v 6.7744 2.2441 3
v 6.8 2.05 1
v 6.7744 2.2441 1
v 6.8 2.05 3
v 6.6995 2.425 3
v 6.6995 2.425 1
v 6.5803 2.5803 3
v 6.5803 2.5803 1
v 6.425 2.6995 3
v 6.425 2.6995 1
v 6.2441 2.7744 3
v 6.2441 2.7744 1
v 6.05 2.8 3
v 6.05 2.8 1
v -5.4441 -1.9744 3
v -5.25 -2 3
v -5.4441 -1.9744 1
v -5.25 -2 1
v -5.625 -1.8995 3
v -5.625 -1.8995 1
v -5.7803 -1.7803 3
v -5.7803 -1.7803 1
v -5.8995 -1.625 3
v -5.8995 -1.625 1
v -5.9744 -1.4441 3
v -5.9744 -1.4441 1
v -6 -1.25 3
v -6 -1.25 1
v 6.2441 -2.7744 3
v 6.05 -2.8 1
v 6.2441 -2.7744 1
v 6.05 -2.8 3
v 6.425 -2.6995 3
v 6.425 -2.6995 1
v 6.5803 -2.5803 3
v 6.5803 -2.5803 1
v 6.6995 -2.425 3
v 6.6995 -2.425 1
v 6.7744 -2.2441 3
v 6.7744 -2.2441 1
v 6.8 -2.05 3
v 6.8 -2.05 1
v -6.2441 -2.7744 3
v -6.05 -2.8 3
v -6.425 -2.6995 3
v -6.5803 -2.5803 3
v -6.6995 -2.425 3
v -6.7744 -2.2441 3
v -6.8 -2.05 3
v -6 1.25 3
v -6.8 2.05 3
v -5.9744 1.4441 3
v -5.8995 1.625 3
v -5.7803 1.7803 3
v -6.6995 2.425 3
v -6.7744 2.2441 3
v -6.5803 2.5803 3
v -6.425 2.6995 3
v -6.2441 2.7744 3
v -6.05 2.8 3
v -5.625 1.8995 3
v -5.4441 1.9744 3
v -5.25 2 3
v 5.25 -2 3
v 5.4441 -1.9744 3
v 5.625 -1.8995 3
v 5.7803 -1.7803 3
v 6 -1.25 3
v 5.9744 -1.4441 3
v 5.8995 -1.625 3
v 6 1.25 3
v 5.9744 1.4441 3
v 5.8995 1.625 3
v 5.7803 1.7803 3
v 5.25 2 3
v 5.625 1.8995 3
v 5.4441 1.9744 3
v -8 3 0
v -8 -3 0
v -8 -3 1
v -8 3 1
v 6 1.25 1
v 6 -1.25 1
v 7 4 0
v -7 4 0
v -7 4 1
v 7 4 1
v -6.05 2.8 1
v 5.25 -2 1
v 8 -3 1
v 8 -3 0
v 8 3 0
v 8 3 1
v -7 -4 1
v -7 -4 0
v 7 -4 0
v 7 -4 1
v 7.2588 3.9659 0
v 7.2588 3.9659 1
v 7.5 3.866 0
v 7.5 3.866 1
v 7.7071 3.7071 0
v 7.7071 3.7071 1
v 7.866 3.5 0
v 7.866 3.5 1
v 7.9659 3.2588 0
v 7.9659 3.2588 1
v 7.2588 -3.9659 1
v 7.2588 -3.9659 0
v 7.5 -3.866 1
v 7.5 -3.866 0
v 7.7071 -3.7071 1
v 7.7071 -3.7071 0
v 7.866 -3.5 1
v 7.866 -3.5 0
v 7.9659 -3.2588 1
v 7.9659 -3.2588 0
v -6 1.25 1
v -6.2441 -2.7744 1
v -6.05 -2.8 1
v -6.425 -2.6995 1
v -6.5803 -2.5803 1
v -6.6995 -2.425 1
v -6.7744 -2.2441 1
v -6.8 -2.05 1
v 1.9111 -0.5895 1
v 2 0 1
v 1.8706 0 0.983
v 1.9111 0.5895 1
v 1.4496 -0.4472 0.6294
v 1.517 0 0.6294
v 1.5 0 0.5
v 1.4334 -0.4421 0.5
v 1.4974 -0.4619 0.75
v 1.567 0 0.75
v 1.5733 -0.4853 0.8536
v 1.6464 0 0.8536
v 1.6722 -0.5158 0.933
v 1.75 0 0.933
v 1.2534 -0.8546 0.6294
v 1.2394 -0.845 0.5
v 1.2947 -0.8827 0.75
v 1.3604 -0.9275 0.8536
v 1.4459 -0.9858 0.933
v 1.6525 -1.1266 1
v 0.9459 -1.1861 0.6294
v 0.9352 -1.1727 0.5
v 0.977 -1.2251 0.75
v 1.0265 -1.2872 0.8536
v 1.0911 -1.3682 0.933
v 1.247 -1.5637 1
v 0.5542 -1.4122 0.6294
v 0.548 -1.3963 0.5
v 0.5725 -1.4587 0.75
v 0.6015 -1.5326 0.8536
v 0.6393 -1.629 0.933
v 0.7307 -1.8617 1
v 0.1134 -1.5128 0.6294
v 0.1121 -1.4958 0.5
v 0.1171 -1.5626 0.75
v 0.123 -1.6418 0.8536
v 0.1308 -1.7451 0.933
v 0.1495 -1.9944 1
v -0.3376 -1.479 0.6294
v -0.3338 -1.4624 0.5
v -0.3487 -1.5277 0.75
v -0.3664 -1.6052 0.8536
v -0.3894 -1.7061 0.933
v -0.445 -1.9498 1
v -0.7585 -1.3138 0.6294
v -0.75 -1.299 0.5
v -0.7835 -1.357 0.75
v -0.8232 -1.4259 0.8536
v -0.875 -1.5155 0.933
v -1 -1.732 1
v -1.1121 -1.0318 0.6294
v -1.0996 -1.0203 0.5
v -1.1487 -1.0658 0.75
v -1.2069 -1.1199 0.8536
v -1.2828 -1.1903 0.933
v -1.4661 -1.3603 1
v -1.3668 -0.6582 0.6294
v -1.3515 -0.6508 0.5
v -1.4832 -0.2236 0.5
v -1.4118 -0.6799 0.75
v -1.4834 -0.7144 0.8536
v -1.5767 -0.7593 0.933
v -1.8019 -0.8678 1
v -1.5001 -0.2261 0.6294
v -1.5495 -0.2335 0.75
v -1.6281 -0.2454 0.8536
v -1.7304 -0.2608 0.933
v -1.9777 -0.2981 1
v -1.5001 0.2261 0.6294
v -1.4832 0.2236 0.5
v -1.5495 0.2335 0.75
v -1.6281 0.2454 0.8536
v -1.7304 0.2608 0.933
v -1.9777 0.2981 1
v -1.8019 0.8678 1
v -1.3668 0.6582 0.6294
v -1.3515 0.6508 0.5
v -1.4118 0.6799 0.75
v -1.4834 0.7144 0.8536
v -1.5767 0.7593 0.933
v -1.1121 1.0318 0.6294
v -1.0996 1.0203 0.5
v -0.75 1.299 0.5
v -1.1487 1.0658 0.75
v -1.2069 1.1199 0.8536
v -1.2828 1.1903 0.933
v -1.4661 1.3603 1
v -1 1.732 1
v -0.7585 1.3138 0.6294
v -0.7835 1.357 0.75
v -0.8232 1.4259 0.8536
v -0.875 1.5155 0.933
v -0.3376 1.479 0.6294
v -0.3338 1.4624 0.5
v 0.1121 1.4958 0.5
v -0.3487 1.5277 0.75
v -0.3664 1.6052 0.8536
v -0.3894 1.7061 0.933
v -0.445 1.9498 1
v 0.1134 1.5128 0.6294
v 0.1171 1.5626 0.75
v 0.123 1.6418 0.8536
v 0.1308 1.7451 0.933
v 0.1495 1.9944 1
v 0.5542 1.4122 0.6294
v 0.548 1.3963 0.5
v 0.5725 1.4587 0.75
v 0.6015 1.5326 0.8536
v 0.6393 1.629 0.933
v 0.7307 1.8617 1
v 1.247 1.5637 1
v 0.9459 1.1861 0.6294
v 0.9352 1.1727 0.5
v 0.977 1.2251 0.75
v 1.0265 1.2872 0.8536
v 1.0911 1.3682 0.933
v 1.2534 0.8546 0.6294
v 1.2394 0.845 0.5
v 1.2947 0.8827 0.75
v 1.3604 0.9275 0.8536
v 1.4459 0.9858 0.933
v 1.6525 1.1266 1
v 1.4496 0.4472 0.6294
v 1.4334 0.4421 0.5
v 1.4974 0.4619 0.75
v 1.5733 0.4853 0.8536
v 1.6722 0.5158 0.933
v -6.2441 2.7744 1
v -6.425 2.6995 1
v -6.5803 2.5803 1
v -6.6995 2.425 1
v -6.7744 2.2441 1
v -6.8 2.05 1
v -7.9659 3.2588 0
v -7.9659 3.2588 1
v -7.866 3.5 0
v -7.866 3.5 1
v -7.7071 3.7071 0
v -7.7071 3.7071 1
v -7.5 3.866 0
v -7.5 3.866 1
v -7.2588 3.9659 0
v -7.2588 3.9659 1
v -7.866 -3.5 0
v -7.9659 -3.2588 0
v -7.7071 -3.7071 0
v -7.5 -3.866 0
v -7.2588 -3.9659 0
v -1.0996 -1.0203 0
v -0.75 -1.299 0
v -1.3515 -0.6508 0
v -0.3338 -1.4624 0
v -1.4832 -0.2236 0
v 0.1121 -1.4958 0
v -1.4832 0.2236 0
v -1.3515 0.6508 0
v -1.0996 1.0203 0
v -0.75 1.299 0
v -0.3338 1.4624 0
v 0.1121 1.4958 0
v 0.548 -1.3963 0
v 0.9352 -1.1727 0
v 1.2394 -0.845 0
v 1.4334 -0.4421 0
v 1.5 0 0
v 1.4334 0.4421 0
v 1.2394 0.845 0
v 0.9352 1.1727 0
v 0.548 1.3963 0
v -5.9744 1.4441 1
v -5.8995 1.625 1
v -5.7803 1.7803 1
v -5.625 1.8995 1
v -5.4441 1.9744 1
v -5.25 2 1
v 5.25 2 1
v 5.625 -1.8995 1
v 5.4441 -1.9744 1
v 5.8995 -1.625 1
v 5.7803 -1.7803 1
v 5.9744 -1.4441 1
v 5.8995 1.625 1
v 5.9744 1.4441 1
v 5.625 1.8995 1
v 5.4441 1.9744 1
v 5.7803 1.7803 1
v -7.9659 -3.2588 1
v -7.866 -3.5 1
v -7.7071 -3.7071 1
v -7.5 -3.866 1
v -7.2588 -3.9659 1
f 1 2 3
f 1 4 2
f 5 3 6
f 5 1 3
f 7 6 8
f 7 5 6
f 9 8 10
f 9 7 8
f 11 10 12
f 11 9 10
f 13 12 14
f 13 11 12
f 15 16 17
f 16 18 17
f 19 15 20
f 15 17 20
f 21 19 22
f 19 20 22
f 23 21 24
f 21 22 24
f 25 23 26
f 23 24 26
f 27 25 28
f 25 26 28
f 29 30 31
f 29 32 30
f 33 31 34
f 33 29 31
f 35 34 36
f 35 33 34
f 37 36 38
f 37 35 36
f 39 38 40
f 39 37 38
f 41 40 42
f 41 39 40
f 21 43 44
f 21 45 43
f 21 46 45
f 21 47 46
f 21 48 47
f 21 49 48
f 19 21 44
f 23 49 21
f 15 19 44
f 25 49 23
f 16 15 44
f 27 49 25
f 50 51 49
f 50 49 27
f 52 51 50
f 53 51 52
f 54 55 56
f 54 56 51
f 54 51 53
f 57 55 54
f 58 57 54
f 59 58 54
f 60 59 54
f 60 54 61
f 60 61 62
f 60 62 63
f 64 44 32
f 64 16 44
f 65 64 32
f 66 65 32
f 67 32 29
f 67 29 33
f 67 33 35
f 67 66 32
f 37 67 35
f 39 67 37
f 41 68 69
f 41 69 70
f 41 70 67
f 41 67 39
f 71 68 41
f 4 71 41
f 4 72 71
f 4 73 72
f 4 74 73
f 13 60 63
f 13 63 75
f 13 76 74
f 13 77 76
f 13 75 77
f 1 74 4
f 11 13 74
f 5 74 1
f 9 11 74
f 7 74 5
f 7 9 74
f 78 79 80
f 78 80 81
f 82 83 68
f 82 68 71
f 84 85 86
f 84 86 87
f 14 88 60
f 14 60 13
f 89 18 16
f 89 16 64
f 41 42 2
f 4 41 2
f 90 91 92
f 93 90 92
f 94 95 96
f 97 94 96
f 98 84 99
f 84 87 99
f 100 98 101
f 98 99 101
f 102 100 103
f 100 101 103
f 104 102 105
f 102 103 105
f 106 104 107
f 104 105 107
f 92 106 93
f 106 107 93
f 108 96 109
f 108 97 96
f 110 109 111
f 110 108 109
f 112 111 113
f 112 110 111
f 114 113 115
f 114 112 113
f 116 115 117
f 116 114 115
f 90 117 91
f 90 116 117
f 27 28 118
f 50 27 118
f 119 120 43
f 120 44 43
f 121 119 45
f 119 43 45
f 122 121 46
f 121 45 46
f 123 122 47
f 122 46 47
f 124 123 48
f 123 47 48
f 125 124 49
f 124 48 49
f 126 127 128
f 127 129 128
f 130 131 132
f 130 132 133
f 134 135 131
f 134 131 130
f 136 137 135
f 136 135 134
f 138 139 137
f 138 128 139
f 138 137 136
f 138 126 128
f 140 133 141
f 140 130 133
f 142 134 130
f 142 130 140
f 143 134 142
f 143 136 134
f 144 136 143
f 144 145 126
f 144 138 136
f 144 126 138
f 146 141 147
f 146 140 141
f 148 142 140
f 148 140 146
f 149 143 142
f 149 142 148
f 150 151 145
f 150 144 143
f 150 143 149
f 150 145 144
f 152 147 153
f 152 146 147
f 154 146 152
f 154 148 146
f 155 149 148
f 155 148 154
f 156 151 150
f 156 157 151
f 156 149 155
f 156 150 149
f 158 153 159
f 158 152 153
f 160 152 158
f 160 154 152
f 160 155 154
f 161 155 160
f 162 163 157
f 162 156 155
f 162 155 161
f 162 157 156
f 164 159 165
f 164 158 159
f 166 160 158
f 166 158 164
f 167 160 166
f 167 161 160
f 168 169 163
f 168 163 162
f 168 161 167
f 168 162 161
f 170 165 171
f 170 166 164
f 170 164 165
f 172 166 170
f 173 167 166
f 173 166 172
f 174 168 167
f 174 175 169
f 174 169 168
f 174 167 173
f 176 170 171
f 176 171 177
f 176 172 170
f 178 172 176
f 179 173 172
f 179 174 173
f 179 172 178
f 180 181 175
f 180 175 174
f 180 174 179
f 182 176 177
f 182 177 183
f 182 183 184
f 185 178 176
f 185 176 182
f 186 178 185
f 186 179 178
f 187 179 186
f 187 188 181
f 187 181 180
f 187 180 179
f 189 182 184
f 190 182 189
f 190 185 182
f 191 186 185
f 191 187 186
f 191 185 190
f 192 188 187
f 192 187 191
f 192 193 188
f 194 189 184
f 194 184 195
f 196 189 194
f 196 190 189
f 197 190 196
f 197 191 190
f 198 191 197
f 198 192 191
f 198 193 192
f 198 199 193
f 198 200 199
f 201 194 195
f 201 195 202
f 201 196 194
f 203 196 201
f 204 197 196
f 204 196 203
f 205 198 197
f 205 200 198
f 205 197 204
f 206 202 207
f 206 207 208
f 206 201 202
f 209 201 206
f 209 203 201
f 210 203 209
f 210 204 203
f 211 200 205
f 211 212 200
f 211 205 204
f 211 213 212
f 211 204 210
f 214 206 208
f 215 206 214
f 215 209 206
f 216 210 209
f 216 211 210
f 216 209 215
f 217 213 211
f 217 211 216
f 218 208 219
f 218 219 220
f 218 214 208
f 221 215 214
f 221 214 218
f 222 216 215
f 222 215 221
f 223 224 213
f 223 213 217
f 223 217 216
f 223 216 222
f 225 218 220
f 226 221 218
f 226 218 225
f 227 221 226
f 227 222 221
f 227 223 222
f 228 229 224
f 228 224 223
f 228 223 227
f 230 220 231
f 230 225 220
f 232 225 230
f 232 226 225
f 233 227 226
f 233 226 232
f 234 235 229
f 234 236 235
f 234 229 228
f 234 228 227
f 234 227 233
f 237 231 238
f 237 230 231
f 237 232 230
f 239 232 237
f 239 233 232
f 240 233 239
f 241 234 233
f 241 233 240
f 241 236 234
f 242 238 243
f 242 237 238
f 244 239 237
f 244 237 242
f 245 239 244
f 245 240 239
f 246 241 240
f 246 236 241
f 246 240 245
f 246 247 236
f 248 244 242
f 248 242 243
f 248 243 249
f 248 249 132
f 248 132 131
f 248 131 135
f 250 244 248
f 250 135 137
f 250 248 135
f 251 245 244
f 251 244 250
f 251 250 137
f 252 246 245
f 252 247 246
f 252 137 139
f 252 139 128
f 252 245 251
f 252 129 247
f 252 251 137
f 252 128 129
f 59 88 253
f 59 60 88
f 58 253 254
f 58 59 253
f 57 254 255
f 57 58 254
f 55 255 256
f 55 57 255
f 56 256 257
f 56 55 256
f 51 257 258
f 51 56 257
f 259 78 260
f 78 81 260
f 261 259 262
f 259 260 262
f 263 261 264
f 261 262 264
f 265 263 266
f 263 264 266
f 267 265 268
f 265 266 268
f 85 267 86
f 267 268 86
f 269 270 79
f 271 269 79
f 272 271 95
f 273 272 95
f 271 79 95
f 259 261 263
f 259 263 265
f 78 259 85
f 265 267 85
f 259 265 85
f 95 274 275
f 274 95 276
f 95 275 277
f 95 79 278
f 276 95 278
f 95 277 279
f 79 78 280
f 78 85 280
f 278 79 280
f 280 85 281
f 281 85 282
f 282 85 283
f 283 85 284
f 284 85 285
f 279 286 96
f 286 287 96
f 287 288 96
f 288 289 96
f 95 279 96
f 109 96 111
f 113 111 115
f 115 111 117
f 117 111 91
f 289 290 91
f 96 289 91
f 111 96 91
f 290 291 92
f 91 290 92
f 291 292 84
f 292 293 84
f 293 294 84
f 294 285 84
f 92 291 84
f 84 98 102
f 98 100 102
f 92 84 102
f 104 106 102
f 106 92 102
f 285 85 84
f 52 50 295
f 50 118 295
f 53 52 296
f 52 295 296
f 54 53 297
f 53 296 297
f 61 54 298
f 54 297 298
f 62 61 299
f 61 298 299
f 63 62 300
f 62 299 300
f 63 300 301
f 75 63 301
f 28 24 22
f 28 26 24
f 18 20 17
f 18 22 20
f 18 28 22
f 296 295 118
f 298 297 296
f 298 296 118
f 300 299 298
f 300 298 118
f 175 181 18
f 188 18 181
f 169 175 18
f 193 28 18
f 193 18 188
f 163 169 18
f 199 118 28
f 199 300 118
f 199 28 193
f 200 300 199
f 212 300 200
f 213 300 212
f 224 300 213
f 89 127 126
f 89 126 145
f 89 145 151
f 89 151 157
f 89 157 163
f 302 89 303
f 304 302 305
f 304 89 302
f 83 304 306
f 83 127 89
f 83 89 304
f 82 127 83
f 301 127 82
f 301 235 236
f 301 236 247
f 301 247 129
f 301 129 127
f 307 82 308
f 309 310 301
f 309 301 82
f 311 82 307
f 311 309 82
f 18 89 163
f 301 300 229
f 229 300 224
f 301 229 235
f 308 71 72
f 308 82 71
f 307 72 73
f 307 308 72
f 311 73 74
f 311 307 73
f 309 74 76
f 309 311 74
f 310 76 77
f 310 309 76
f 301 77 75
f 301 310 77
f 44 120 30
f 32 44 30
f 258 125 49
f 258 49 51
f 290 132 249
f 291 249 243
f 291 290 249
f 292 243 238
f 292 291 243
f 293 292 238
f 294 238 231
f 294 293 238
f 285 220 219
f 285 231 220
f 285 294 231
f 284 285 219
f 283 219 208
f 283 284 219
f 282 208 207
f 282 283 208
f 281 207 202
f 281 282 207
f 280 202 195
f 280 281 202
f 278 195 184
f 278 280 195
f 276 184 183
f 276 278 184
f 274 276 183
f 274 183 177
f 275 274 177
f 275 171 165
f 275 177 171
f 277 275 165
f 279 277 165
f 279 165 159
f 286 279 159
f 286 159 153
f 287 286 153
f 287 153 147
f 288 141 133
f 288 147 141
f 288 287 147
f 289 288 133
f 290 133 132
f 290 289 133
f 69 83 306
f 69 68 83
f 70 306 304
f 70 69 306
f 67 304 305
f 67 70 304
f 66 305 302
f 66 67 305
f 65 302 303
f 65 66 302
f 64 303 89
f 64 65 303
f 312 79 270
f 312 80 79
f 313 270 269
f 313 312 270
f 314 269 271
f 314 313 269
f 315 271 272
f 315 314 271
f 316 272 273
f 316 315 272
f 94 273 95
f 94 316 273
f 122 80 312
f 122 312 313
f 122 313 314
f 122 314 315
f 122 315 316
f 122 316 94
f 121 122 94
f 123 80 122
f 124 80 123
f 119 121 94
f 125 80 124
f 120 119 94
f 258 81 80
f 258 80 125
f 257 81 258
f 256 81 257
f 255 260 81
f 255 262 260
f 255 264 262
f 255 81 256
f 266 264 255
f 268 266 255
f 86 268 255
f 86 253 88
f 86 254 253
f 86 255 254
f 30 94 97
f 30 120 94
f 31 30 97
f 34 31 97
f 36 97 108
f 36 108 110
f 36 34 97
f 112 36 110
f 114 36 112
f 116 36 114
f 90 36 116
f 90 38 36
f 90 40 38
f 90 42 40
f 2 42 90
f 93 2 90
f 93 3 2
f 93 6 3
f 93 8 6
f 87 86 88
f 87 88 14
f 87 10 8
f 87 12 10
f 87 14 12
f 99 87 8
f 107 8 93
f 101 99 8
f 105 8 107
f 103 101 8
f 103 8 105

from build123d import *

# Parameters (mm, degrees)
F0_W     = 13.6
F0_H     = 5.6
F1_DEPTH = 3
F2_T     = -0.8
F3_W     = 16
F3_H     = 8
F4_DEPTH = 1
F5_R     = 0.75
F6_R     = 1
F7_R     = 1.5
F8_DEPTH = 25
F10_R    = 0.49999


# Not quite as in the source:
# - a fillet or chamfer is up to 0.001 mm smaller than in the source, because OpenCascade refuses the exact size


with BuildPart() as f1:
    # F0 (on Top) → F1 (new body)
    with BuildSketch(Plane.XY):
        Rectangle(F0_W, F0_H)
    extrude(amount=F1_DEPTH)

    # F2
    f2_openings = [f1.faces().sort_by_distance(p)[0] for p in [
        (0, 0, 3),
    ]]
    offset(amount=F2_T, openings=f2_openings)

    # F3 (on Top) → F4 (join)
    with BuildSketch(Plane.XY):
        Rectangle(F3_W, F3_H)
    extrude(amount=F4_DEPTH)

    # F5
    f5_edges = [f1.edges().sort_by_distance(p)[0] for p in [
        (6.8, -2.8, 2),
        (6.8, 2.8, 2),
        (6, 2, 2),
        (6, -2, 2),
        (-6, 2, 2),
        (-6, -2, 2),
        (-6.8, 2.8, 2),
        (-6.8, -2.8, 2),
    ]]
    fillet(f5_edges, radius=F5_R)

    # F6
    f6_edges = [f1.edges().sort_by_distance(p)[0] for p in [
        (-8, -4, 0.5),
        (8, -4, 0.5),
        (8, 4, 0.5),
        (-8, 4, 0.5),
    ]]
    fillet(f6_edges, radius=F6_R)


with BuildPart() as f8:
    # F7 (on Top) → F8 (new body)
    with BuildSketch(Plane.XY):
        Circle(F7_R)
    extrude(amount=F8_DEPTH)


with BuildPart() as f1_1:
    add(f1.part)

    # F9: cut F8
    add(f8.part, mode=Mode.SUBTRACT)

    # F10 (radius 0.5 in the source; OpenCascade refuses exactly that, so slightly less here)
    f10_edges = [f1_1.edges().sort_by_distance(p)[0] for p in [
        (-1.5, 0, 1),
    ]]
    fillet(f10_edges, radius=F10_R)


solid = f1_1.part
